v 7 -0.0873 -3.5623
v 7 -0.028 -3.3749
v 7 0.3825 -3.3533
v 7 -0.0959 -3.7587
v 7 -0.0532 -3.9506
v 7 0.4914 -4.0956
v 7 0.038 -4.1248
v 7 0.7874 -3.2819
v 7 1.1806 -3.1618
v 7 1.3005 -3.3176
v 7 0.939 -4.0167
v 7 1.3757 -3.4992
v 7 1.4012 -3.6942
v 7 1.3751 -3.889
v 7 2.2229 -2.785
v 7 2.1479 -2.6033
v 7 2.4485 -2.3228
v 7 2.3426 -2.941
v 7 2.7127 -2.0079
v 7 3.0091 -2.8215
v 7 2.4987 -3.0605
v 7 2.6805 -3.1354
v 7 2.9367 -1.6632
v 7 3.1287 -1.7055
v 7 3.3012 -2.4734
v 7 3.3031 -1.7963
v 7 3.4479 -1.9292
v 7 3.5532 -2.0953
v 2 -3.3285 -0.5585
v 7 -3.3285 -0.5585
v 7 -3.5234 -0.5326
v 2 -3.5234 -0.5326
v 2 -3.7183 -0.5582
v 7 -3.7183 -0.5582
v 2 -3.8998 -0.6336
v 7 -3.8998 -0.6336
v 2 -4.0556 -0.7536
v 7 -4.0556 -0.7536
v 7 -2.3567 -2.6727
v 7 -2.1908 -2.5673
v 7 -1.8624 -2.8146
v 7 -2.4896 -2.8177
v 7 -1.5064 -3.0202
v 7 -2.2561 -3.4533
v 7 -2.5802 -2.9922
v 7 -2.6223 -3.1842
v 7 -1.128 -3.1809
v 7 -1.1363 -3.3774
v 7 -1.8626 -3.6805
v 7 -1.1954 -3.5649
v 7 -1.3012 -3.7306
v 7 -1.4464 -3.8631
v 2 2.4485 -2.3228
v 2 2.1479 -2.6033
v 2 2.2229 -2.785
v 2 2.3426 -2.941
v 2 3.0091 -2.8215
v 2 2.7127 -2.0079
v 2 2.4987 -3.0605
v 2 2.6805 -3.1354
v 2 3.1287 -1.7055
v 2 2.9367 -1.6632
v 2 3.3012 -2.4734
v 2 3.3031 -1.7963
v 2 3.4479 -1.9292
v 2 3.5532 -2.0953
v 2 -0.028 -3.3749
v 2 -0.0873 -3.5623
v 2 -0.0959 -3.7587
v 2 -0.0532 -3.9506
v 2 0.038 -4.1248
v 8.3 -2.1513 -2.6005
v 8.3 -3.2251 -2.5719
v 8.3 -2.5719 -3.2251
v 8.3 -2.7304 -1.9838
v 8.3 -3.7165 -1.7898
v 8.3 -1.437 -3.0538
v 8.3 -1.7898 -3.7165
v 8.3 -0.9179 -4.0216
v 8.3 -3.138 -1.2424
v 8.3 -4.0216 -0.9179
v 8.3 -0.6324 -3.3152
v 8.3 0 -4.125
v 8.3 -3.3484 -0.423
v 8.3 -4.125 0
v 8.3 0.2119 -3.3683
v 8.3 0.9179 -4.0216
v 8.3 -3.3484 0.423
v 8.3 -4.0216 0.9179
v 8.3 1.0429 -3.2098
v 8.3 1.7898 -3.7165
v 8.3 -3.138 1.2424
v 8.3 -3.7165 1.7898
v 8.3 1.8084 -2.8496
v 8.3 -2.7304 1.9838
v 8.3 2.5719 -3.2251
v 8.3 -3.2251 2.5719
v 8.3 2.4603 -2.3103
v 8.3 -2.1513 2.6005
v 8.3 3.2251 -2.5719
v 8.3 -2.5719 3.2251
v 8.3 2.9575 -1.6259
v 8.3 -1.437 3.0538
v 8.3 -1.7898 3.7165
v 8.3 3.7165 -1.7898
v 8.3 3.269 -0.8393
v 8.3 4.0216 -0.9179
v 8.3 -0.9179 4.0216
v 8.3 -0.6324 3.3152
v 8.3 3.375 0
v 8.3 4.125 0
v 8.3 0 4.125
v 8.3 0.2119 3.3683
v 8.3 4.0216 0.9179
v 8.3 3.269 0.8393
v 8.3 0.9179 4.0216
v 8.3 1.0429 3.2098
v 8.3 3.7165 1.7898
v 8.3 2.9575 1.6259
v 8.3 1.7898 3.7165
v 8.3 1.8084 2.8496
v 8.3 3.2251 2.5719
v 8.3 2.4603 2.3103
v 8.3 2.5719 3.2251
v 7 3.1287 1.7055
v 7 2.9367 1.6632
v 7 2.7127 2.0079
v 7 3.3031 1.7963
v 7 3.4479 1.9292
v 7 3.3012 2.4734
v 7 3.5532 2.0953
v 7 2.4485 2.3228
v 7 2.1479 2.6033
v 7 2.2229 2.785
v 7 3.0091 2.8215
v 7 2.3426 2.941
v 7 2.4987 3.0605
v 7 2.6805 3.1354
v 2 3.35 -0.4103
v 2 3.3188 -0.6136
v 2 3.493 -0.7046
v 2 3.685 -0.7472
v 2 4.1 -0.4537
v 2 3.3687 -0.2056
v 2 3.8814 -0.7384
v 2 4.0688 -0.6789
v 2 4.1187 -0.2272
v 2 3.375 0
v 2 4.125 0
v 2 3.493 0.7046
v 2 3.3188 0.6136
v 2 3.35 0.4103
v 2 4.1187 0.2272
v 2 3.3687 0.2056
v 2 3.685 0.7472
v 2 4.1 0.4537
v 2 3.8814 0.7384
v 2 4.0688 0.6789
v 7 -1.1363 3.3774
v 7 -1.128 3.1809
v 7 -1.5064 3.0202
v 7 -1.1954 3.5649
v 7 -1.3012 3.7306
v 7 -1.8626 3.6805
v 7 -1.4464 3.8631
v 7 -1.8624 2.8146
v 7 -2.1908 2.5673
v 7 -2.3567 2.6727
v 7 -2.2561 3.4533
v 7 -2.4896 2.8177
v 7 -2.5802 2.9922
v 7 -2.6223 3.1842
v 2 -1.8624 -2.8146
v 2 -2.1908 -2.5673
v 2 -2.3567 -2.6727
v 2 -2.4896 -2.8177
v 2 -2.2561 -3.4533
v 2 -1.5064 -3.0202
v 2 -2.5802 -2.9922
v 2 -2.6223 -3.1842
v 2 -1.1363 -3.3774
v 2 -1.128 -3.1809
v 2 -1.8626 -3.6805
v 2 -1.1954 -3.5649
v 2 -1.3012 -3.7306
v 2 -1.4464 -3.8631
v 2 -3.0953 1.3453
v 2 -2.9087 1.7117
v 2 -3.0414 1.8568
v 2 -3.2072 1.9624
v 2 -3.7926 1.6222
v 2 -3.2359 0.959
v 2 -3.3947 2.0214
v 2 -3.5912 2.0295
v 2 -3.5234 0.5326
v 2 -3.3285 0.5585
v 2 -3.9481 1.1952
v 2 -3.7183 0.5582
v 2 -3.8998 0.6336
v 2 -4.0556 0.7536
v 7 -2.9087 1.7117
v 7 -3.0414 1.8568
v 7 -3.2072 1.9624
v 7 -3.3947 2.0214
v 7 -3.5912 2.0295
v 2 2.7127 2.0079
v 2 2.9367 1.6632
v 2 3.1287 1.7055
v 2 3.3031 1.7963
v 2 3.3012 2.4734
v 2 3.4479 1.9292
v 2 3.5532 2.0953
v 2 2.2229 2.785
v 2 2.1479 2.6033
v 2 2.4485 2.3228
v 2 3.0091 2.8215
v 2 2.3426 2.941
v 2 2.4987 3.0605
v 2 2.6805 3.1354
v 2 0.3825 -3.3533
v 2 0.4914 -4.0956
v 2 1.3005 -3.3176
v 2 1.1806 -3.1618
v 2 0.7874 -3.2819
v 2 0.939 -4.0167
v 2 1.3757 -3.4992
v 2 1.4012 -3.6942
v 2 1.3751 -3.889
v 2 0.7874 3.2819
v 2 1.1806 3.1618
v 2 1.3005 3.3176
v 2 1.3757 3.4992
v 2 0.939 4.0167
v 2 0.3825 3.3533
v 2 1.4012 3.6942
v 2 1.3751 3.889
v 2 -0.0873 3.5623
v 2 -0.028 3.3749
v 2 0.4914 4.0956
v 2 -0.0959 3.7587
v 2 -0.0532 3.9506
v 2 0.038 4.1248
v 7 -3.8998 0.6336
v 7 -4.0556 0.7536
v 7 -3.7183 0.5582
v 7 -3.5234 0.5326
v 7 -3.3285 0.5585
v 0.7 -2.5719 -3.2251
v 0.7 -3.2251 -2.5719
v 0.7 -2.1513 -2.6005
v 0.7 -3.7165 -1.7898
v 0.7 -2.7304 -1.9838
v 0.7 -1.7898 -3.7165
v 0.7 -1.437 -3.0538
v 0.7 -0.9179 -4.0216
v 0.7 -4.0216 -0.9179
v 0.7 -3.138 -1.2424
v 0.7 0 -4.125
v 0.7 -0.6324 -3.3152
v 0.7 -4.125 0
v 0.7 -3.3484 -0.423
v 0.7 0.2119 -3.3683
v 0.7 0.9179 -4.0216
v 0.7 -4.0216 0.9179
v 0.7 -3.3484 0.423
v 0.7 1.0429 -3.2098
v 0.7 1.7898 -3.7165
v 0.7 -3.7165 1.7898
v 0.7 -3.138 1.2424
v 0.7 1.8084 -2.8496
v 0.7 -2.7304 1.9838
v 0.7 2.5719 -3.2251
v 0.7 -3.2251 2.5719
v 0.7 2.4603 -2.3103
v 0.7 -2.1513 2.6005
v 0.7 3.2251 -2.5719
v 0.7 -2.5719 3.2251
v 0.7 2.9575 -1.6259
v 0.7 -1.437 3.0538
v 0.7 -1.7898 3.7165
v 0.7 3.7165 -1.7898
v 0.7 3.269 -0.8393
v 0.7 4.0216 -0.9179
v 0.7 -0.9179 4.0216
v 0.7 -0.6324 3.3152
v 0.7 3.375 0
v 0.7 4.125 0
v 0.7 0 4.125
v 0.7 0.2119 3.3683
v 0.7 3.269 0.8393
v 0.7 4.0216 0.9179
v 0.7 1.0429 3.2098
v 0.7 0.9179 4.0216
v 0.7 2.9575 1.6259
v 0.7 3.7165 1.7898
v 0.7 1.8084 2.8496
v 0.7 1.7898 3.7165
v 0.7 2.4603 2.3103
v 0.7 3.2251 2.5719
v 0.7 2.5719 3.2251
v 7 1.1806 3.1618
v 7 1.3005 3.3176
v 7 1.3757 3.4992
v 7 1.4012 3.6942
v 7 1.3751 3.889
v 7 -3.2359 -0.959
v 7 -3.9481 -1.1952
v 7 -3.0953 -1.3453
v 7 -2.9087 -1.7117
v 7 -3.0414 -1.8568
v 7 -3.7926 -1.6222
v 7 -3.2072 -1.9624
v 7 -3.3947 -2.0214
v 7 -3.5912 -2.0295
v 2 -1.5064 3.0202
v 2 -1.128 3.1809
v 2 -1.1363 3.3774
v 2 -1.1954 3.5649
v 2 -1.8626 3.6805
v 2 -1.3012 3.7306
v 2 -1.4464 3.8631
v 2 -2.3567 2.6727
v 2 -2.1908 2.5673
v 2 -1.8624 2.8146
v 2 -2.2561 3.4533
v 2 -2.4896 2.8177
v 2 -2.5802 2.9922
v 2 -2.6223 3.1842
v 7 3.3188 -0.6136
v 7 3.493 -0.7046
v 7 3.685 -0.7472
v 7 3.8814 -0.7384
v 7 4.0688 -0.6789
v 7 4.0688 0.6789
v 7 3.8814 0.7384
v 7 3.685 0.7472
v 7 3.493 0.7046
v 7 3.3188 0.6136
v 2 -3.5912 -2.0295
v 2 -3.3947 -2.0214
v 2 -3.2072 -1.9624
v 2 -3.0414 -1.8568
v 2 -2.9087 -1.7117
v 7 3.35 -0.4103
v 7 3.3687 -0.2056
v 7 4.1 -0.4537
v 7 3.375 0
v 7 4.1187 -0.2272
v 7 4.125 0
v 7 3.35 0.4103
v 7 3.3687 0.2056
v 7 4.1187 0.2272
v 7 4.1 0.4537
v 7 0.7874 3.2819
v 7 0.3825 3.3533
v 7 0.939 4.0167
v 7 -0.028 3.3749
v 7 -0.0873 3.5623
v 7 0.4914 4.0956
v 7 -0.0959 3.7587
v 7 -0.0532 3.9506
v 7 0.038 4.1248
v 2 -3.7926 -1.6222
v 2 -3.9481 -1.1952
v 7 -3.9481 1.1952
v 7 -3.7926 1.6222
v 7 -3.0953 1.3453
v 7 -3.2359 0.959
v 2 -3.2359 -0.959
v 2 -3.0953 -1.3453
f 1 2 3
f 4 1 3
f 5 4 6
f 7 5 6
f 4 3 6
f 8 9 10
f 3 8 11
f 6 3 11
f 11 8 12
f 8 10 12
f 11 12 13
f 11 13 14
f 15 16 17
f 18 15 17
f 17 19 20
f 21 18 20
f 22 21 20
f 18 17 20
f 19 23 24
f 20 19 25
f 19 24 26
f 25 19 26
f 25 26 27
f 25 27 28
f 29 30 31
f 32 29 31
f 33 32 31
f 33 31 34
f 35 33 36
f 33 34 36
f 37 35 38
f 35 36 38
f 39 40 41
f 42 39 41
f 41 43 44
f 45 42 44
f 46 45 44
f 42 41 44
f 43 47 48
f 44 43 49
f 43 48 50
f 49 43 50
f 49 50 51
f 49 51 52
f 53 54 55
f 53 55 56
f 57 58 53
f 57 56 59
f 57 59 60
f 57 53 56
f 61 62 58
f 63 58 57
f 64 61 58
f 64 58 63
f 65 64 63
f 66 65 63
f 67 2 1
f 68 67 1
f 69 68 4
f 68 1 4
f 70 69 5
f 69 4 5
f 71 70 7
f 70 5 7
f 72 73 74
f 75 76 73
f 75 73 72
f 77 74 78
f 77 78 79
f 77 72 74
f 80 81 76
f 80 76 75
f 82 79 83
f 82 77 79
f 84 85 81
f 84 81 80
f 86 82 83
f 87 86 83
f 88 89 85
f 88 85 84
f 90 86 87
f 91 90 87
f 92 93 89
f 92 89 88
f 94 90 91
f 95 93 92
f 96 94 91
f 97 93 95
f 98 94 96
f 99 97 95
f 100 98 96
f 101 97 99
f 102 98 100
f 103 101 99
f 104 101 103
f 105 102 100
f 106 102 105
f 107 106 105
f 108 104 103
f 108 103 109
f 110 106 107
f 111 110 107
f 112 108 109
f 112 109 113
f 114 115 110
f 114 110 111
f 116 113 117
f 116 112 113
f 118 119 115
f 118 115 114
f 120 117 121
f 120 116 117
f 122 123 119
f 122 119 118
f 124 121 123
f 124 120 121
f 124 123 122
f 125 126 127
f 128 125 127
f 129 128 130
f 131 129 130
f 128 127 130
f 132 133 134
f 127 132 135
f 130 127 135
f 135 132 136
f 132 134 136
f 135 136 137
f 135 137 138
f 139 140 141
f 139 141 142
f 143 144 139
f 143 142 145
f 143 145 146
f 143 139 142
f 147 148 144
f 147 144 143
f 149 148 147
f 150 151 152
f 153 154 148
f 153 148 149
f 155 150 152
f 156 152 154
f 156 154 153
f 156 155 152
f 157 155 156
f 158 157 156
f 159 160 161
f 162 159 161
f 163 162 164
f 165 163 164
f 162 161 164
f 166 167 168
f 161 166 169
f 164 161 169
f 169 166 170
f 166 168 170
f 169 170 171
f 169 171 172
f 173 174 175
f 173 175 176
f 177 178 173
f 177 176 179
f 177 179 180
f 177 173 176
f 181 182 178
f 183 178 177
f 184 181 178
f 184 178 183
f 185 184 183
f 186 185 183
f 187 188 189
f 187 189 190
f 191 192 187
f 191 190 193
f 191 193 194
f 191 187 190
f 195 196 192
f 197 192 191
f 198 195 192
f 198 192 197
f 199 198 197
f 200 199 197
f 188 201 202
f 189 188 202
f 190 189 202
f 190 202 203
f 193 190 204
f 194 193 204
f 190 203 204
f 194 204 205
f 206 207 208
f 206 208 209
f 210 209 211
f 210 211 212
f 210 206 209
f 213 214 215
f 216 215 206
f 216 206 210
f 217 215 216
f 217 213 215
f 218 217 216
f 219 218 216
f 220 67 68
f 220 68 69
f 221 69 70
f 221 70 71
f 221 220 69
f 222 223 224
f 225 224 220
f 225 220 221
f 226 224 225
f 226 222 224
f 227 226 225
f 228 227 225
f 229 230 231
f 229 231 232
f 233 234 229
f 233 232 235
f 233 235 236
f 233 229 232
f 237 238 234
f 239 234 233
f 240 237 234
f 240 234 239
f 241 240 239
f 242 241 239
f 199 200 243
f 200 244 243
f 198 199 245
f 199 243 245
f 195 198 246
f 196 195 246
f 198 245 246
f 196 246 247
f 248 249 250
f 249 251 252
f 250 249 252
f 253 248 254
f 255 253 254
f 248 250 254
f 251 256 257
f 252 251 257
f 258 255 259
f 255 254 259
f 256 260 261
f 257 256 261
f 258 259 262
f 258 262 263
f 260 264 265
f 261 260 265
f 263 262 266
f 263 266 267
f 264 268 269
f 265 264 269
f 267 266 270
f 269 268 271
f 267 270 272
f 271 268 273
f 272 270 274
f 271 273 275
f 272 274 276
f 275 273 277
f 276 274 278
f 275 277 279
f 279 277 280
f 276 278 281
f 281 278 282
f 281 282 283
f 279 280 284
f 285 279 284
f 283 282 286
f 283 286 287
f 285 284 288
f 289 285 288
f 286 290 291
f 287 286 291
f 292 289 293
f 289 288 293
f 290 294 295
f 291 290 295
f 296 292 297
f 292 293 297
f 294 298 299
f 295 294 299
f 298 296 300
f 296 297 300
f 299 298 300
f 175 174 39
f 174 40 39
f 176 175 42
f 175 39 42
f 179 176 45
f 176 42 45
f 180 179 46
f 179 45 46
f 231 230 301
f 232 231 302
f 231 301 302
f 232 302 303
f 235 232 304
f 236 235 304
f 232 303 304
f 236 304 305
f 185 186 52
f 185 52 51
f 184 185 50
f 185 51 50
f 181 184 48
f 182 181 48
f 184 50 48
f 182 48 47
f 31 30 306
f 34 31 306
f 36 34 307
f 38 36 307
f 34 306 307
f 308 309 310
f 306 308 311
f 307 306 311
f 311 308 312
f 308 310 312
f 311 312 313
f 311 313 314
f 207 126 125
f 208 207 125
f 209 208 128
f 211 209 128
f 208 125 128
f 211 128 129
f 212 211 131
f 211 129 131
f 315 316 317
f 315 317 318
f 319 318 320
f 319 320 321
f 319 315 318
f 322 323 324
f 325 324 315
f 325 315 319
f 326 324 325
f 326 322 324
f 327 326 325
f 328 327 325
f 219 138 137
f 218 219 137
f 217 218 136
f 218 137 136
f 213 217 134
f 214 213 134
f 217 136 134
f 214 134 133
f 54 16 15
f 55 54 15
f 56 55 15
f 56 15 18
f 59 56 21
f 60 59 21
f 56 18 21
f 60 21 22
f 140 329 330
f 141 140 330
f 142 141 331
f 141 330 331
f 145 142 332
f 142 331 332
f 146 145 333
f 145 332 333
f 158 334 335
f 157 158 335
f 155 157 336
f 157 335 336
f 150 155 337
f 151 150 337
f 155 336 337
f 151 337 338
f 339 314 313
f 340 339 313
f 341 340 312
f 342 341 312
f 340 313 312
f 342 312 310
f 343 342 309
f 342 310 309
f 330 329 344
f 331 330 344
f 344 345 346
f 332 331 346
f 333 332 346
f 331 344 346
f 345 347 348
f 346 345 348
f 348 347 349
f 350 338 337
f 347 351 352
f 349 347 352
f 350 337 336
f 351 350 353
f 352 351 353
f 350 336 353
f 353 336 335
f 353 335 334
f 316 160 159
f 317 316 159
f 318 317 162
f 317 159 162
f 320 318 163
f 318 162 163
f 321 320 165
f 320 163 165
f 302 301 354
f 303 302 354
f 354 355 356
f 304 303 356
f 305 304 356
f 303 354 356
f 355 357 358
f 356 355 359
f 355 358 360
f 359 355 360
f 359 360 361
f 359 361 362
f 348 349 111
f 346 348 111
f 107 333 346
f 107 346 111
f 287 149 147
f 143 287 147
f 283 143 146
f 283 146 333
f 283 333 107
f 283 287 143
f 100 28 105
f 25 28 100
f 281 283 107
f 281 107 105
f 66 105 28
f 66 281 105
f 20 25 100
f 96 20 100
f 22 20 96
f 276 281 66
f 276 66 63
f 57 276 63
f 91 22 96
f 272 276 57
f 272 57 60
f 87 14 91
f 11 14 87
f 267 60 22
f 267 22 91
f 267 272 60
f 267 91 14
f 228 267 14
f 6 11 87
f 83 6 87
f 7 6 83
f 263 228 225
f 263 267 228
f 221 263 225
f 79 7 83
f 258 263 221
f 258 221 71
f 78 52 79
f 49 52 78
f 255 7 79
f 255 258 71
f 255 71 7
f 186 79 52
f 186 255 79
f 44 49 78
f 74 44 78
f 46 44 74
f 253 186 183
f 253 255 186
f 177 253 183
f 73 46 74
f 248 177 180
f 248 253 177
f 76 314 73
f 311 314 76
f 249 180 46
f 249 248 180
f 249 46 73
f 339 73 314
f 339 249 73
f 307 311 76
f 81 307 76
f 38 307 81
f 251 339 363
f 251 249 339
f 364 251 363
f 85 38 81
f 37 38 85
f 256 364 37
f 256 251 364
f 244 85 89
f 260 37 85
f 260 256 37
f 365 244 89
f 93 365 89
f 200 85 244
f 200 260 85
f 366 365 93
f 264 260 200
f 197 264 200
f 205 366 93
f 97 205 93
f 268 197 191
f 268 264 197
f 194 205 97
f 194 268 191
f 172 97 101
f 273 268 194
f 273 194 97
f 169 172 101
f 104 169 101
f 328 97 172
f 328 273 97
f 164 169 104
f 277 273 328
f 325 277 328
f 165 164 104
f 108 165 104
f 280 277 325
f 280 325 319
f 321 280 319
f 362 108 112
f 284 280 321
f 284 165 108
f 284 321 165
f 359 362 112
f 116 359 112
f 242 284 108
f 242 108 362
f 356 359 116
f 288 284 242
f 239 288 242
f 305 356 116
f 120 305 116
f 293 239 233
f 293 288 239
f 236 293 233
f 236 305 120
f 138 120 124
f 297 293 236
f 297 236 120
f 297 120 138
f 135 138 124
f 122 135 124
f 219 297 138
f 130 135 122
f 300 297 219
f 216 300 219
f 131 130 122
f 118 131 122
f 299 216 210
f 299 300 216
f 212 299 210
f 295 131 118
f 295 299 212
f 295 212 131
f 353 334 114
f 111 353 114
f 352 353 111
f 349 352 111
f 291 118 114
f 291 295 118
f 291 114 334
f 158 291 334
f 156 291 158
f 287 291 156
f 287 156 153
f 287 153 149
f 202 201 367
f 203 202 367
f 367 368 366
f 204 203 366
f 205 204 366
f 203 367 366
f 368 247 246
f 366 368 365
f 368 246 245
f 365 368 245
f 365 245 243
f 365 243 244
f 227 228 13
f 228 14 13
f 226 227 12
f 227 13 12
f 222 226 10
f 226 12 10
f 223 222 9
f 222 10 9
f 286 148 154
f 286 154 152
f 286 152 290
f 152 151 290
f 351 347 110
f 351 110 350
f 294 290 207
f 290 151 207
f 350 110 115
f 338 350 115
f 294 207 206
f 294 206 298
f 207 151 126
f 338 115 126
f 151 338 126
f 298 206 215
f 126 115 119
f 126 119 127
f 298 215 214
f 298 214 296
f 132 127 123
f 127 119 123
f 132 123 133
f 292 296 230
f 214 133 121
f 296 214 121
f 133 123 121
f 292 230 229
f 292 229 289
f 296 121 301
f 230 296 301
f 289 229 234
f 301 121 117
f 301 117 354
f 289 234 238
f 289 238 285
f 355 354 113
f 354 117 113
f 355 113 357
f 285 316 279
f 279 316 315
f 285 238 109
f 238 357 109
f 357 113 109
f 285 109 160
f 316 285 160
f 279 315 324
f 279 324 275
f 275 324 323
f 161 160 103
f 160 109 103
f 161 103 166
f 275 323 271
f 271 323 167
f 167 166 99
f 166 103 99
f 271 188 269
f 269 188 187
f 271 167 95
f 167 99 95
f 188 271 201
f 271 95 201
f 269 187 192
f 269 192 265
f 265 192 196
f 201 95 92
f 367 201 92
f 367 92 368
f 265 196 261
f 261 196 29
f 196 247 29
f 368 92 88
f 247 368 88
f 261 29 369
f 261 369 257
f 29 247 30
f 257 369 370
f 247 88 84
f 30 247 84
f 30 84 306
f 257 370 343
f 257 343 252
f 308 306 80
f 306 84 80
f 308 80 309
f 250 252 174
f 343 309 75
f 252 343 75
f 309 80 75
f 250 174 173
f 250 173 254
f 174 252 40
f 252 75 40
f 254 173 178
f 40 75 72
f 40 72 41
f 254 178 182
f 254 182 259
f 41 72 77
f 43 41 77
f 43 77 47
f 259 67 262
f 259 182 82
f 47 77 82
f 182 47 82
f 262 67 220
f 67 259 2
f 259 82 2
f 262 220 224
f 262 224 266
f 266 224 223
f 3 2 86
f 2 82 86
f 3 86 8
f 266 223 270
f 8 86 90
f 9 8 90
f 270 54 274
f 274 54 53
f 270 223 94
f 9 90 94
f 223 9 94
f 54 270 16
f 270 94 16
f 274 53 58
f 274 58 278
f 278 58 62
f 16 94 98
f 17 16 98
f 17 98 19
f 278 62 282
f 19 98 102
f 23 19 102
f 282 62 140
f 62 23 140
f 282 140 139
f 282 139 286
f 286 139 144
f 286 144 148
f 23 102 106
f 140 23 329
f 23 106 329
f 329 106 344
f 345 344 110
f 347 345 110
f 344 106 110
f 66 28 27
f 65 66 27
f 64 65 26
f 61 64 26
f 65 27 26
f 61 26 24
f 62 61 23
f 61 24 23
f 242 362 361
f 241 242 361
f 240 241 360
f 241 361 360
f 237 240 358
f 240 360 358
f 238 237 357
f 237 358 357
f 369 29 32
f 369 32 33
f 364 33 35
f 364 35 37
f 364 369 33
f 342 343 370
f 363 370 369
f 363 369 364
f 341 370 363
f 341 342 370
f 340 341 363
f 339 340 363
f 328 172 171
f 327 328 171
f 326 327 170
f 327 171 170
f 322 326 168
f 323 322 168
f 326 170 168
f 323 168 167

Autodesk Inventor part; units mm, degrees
sketch "Sketch_1" plane through (0, 0, 0) normal (0, 0, 1) x (1, 0, 0)
  line L0 (8.3, 0) -> (0.7, 0)
  line L1 (0.7, 3.375) -> (8.3, 3.375)
  line L2 (8.3, 3.375) -> (8.3, 4.125)
  line L3 (8.3, 4.125) -> (0.7, 4.125)
  line L4 (0.7, 4.125) -> (0.7, 3.375)
revolve "Revolution1" add sketch "Sketch_1" angle 360 about axis through (8.3, 0, 0) along (1, 0, 0)
sketch "Sketch_2" plane through (0, 0, 0) normal (0, 0, 1) x (1, 0, 0)
  line L0 (7, 3.75) -> (2, 3.75)
  line L1 (2, 3.75) -> (2, 4.5)
  line L2 (2, 4.5) -> (7, 4.5)
  line L3 (7, 4.5) -> (7, 3.75)
  line L4 (7, 3.75) -> (2, 3.75)
revolve "Revolution2" cut sketch "Sketch_2" angle 360 about axis through (7, 3.75, 0) along (1, 0, 0)
pattern_circular "Circular Pattern1" count 9 over 360 about axis through (4.5, 0, 0) along (1, 0, 0) of "Revolution2"
ref_plane "IP_1_XY" through (4.5, 0, 0) normal (1, 0, 0) x (0, 0, -1)
ref_plane "IP_1_YZ" through (4.5, 0, 0) normal (0, 0, -1) x (0, 1, 0)
ref_plane "IP_1_ZX" through (4.5, 0, 0) normal (0, 1, 0) x (1, 0, 0)
ref_plane "IP_3_1_XY" through (4.5, 3.75, 0) normal (1, 0, 0) x (0, 0, -1)
ref_plane "IP_3_1_YZ" through (4.5, 3.75, 0) normal (0, 0, -1) x (0, 1, 0)
ref_plane "IP_3_1_ZX" through (4.5, 3.75, 0) normal (0, 1, 0) x (1, 0, 0)
ref_plane "IP_3_2_XY" through (4.5, 2.8727, 2.4105) normal (1, 0, 0) x (0, 0, -1)
ref_plane "IP_3_2_YZ" through (4.5, 2.8727, 2.4105) normal (0, 0, -1) x (0, 1, 0)
ref_plane "IP_3_2_ZX" through (4.5, 2.8727, 2.4105) normal (0, 1, 0) x (1, 0, 0)
ref_plane "IP_3_3_XY" through (4.5, 0.6512, 3.693) normal (1, 0, 0) x (0, 0, -1)
ref_plane "IP_3_3_YZ" through (4.5, 0.6512, 3.693) normal (0, 0, -1) x (0, 1, 0)
ref_plane "IP_3_3_ZX" through (4.5, 0.6512, 3.693) normal (0, 1, 0) x (1, 0, 0)
ref_plane "IP_3_4_XY" through (4.5, -1.875, 3.2476) normal (1, 0, 0) x (0, 0, -1)
ref_plane "IP_3_4_YZ" through (4.5, -1.875, 3.2476) normal (0, 0, -1) x (0, 1, 0)
ref_plane "IP_3_4_ZX" through (4.5, -1.875, 3.2476) normal (0, 1, 0) x (1, 0, 0)
ref_plane "IP_3_5_XY" through (4.5, -3.5238, 1.2826) normal (1, 0, 0) x (0, 0, -1)
ref_plane "IP_3_5_YZ" through (4.5, -3.5238, 1.2826) normal (0, 0, -1) x (0, 1, 0)
ref_plane "IP_3_5_ZX" through (4.5, -3.5238, 1.2826) normal (0, 1, 0) x (1, 0, 0)
ref_plane "IP_3_6_XY" through (4.5, -3.5238, -1.2826) normal (1, 0, 0) x (0, 0, -1)
ref_plane "IP_3_6_YZ" through (4.5, -3.5238, -1.2826) normal (0, 0, -1) x (0, 1, 0)
ref_plane "IP_3_6_ZX" through (4.5, -3.5238, -1.2826) normal (0, 1, 0) x (1, 0, 0)
ref_plane "IP_3_7_XY" through (4.5, -1.875, -3.2476) normal (1, 0, 0) x (0, 0, -1)
ref_plane "IP_3_7_YZ" through (4.5, -1.875, -3.2476) normal (0, 0, -1) x (0, 1, 0)
ref_plane "IP_3_7_ZX" through (4.5, -1.875, -3.2476) normal (0, 1, 0) x (1, 0, 0)
ref_plane "IP_3_8_XY" through (4.5, 0.6512, -3.693) normal (1, 0, 0) x (0, 0, -1)
ref_plane "IP_3_8_YZ" through (4.5, 0.6512, -3.693) normal (0, 0, -1) x (0, 1, 0)
ref_plane "IP_3_8_ZX" through (4.5, 0.6512, -3.693) normal (0, 1, 0) x (1, 0, 0)
ref_plane "IP_3_9_XY" through (4.5, 2.8727, -2.4105) normal (1, 0, 0) x (0, 0, -1)
ref_plane "IP_3_9_YZ" through (4.5, 2.8727, -2.4105) normal (0, 0, -1) x (0, 1, 0)
ref_plane "IP_3_9_ZX" through (4.5, 2.8727, -2.4105) normal (0, 1, 0) x (1, 0, 0)
properties part number "HK0609FMCA"
